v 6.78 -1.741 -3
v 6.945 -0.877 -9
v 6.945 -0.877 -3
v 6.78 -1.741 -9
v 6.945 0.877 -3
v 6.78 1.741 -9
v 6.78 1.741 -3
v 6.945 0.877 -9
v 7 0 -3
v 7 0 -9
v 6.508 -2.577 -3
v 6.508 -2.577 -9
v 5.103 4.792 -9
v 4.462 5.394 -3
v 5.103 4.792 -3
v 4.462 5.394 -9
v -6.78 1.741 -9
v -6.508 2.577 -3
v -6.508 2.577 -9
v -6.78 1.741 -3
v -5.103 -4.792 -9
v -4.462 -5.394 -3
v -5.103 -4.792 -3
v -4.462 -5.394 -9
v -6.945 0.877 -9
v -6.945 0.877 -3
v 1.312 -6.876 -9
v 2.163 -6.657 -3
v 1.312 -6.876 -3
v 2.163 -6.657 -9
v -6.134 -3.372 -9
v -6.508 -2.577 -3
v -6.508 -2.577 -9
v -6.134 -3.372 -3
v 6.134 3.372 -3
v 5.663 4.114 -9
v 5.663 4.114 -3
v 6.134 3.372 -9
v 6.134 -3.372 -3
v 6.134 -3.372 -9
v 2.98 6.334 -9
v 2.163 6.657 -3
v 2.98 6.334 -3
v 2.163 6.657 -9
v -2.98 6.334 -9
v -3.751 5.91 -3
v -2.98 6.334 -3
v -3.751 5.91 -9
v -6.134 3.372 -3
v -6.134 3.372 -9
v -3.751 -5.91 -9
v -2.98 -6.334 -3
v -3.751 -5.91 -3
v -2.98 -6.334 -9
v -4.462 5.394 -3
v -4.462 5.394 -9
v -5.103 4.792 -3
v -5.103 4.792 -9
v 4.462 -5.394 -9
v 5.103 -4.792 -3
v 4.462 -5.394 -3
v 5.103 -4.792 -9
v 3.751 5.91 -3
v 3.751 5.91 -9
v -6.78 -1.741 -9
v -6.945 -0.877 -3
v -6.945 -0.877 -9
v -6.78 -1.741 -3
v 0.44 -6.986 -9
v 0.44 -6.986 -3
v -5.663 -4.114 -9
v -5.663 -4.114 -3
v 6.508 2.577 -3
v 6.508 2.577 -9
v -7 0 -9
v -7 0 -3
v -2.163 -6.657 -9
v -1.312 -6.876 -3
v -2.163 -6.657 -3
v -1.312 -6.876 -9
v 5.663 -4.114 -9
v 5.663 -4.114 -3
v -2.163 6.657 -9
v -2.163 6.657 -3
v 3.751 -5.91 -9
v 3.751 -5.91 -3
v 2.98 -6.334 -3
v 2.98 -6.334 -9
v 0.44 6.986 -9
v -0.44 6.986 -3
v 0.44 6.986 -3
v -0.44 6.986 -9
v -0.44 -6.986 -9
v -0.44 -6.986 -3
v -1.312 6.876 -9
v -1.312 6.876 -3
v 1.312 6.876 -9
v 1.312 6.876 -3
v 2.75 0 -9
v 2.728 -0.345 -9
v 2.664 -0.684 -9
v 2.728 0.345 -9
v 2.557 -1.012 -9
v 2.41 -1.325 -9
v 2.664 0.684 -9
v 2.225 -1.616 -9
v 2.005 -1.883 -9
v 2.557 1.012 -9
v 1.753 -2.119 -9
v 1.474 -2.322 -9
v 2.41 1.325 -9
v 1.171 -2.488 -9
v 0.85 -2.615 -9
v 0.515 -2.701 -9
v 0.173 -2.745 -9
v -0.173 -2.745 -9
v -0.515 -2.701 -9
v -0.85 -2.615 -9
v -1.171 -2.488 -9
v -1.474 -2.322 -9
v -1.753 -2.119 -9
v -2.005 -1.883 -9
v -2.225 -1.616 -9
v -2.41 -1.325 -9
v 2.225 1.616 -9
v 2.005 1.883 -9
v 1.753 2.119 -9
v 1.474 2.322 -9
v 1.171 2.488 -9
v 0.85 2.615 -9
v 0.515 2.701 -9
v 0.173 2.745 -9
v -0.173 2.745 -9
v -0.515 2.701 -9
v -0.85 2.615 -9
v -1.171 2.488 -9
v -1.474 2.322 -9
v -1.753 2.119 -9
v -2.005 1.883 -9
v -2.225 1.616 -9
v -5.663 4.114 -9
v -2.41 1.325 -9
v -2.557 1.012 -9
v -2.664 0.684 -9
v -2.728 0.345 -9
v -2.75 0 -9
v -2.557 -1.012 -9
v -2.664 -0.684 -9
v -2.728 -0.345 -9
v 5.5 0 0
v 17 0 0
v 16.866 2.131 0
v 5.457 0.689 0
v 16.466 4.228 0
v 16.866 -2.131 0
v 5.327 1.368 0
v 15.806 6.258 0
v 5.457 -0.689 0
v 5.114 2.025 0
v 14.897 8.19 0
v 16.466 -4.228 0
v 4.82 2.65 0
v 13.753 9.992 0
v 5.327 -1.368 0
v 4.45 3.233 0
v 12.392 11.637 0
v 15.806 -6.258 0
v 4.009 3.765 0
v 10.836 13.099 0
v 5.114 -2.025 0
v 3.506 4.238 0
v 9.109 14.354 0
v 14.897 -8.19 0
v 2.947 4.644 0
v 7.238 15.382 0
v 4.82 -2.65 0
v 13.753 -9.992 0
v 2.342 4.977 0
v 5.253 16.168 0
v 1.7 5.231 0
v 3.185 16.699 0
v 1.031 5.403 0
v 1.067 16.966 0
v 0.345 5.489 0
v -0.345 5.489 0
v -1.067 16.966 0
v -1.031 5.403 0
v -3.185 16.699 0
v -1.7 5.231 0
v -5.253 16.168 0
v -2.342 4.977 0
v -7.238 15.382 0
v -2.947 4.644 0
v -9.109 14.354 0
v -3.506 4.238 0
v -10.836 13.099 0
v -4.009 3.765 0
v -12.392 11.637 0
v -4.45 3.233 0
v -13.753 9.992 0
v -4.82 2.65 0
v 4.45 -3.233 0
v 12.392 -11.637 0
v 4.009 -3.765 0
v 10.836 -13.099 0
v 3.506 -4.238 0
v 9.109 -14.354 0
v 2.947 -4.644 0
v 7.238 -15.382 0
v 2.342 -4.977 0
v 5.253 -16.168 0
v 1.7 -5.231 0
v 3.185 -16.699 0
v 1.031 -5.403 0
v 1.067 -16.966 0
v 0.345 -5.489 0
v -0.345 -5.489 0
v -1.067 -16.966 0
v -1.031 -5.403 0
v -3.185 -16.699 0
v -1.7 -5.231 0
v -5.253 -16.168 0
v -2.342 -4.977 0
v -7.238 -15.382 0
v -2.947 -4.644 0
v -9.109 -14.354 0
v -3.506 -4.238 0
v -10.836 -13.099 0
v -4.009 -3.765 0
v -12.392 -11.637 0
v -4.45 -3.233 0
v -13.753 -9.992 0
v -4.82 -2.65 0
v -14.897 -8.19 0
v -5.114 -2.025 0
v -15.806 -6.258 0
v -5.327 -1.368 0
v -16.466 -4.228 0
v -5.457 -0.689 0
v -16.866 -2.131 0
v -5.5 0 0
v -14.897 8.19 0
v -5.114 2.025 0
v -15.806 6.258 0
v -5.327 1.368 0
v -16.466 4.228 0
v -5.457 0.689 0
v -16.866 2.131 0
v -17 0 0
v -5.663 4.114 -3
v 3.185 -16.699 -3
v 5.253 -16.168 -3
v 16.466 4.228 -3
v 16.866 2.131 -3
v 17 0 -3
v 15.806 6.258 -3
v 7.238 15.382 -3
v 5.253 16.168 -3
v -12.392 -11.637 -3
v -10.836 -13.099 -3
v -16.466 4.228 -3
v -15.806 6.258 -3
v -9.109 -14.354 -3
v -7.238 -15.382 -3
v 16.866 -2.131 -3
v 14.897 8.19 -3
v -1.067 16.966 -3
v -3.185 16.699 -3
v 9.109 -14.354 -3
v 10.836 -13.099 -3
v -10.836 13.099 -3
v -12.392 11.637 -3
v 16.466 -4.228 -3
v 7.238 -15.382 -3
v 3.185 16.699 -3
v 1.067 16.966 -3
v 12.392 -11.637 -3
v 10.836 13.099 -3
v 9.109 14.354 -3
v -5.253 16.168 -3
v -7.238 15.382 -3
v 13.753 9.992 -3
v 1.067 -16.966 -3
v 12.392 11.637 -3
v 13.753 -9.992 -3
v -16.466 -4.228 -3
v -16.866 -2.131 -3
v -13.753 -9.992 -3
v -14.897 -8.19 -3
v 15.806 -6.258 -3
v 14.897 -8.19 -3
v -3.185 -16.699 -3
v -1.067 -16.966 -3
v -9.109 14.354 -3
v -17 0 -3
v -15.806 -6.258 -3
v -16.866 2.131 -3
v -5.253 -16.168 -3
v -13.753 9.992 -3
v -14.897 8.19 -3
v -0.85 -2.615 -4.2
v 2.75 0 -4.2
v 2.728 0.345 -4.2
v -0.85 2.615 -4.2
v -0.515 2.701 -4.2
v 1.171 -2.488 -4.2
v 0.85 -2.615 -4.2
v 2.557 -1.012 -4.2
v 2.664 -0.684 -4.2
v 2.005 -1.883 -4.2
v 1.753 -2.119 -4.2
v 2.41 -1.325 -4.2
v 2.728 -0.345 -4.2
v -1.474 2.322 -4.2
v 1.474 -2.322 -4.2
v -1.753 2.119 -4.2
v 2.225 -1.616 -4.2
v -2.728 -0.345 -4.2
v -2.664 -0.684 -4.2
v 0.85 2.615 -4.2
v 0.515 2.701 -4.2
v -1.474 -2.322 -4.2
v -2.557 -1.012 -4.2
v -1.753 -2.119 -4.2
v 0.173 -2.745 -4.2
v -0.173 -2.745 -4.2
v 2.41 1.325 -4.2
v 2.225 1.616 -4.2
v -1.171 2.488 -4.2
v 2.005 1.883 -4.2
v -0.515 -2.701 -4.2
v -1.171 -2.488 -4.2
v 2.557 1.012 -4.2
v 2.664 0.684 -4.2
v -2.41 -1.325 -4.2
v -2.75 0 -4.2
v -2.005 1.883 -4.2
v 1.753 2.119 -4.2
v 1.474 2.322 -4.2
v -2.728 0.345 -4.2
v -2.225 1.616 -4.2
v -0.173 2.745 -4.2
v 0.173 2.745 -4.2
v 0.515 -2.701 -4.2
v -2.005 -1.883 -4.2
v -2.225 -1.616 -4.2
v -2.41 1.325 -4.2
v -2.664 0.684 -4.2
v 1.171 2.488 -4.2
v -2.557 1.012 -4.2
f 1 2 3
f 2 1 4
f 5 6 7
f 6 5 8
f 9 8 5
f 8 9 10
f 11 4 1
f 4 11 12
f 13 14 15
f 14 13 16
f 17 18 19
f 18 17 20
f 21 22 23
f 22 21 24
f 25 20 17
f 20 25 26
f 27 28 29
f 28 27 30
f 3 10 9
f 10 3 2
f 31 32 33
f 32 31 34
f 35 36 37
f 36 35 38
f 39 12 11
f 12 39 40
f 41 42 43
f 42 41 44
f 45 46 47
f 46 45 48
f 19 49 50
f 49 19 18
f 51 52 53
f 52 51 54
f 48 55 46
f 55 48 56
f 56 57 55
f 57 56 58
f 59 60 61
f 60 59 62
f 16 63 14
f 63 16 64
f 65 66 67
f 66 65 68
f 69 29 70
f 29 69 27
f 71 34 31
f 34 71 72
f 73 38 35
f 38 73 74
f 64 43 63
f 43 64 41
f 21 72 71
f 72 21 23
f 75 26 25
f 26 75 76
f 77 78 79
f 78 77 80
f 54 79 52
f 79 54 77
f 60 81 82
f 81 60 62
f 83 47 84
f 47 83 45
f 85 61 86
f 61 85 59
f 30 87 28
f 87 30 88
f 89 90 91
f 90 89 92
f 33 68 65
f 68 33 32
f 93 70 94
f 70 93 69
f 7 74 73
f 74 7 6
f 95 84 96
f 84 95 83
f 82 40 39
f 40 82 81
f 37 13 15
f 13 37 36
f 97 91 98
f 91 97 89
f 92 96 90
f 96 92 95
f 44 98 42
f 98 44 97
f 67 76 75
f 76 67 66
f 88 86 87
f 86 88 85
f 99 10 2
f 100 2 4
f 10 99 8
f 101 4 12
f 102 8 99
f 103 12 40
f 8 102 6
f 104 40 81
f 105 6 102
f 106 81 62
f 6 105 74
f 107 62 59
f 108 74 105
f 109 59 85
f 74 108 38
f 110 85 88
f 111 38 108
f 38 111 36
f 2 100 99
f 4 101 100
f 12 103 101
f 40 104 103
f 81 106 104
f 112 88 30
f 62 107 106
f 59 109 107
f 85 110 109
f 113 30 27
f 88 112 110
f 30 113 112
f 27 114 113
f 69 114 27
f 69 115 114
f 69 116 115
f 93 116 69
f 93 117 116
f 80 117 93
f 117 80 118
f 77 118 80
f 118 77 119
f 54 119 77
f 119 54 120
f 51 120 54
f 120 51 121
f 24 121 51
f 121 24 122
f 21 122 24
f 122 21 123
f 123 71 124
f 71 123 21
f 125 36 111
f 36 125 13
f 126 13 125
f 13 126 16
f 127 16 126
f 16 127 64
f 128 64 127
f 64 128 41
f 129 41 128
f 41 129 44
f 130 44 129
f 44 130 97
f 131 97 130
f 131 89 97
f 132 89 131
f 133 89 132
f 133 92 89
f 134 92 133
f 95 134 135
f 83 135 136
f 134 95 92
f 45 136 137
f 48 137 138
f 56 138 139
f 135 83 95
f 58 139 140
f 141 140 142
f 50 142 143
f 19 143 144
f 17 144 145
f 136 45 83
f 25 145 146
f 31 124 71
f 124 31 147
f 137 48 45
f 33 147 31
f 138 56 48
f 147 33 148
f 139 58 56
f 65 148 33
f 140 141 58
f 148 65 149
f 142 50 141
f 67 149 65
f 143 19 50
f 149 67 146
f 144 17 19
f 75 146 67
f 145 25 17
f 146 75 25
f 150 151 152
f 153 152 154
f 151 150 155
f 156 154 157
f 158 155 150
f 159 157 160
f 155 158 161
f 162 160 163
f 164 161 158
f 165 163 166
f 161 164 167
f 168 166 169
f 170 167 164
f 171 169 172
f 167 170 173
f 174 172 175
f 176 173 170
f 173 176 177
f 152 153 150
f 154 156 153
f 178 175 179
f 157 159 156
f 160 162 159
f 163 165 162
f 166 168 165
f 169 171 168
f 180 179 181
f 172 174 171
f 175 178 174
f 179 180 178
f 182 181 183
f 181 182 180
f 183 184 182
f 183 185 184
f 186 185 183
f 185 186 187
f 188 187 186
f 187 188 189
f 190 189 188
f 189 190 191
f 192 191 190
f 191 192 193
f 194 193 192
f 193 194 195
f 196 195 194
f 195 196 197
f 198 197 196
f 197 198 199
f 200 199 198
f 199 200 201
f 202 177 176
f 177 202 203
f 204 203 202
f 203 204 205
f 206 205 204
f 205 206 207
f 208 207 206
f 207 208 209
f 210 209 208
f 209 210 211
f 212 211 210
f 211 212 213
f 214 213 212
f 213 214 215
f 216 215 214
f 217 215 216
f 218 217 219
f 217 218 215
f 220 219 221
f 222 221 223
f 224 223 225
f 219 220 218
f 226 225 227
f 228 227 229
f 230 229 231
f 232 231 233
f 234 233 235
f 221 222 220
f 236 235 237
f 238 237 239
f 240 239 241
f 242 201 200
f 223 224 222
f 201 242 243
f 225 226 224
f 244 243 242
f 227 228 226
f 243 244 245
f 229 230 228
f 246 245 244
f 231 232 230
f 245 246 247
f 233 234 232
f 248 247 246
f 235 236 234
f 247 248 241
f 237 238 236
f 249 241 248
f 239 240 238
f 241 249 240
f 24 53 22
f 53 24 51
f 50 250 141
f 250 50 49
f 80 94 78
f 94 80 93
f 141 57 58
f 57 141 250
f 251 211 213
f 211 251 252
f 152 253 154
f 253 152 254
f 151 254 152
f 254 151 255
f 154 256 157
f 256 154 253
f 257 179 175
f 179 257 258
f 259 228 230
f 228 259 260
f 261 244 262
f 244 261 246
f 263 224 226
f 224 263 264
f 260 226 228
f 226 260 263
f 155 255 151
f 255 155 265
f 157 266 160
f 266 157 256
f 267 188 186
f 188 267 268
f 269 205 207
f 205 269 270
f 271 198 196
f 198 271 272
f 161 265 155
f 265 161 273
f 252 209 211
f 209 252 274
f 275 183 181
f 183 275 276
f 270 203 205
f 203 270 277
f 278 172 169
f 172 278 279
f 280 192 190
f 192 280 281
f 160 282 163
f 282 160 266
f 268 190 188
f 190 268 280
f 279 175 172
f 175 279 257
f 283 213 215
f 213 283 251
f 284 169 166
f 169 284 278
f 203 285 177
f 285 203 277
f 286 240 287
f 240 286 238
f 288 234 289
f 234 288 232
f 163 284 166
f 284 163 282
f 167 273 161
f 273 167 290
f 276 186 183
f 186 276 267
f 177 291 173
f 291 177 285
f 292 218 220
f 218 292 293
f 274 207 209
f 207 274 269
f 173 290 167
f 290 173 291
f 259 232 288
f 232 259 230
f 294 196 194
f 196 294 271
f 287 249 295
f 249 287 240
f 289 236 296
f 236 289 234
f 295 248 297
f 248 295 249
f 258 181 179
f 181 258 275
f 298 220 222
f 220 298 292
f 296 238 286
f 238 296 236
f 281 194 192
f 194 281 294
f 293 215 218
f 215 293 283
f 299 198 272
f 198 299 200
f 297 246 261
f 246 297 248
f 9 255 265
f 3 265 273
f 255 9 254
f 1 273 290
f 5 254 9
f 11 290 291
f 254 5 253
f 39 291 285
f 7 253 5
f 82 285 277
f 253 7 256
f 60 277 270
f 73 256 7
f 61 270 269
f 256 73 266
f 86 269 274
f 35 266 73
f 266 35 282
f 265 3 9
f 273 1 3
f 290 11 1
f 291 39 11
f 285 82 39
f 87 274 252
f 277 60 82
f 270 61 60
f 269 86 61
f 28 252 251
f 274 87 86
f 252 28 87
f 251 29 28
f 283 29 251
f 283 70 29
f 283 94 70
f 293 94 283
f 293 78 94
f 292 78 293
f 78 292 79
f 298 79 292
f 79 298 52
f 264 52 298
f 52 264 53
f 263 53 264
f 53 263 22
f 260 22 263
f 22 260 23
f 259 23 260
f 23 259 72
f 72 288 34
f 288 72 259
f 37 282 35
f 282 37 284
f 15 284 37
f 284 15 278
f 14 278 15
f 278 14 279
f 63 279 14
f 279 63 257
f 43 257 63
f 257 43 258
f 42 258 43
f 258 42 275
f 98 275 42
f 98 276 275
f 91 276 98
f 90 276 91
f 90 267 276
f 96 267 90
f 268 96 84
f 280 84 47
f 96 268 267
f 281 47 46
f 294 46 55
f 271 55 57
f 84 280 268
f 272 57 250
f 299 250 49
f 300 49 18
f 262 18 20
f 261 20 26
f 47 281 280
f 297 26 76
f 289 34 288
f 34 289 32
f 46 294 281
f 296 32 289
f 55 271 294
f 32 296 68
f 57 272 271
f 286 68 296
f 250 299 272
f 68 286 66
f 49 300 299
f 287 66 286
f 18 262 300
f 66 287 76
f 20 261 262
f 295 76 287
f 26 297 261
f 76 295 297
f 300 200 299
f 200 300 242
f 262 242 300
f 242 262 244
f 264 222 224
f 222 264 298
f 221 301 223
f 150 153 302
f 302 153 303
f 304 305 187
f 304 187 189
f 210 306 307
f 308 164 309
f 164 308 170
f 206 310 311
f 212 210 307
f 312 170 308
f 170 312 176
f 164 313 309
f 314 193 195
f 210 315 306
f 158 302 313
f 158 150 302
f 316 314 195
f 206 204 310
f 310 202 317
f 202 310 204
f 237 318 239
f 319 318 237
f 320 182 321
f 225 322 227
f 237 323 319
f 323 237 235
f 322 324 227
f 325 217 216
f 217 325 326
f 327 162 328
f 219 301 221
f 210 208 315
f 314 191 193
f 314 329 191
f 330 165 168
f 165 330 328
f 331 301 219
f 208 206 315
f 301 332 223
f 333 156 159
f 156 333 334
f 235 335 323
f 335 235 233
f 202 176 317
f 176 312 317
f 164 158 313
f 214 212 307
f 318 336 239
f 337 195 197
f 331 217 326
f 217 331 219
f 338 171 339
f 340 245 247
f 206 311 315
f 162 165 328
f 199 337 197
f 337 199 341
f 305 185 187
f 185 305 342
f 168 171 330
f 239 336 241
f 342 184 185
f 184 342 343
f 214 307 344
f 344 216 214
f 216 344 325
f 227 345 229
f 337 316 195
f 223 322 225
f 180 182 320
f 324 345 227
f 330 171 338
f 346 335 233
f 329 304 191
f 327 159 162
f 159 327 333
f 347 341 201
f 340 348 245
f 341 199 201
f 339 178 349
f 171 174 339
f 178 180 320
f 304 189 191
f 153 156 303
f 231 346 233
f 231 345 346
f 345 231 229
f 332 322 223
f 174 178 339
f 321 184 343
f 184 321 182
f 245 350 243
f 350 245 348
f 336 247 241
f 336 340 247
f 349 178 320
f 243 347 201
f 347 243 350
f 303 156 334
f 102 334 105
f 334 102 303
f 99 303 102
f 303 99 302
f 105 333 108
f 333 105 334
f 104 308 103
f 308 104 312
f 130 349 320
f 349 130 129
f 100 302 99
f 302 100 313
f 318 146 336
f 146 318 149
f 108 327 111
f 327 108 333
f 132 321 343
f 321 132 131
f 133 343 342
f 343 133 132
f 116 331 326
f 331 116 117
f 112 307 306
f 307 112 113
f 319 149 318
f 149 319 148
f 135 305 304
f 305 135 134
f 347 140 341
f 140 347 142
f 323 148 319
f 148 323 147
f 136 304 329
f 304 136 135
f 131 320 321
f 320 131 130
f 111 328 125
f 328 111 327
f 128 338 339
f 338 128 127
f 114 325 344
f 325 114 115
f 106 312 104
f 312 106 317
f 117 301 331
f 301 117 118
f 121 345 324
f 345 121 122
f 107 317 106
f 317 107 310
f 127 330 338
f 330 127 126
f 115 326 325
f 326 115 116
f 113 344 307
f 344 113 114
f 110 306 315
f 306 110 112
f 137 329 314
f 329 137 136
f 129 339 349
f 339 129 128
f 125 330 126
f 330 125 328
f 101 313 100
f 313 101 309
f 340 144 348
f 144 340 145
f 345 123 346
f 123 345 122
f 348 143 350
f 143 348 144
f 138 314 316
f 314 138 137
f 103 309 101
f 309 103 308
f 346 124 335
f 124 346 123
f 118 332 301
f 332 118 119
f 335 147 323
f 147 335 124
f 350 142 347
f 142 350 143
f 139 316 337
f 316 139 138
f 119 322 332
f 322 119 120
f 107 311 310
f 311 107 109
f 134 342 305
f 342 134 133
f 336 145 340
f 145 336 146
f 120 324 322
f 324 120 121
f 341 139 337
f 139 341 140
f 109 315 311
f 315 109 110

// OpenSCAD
$fn = 50;


difference() {
	union() {
		translate(v = [0, 0, -9.0000000000]) {
			cylinder(h = 9, r = 7.0000000000);
		}
		translate(v = [0, 0, -3.0000000000]) {
			cylinder(h = 3, r = 17.0000000000);
		}
	}
	union() {
		translate(v = [0, 0, 0]) {
			rotate(a = [0, 0, 0]) {
				difference() {
					union() {
						#translate(v = [0, 0, -9.0000000000]) {
							cylinder(h = 9, r = 2.2500000000);
						}
						#translate(v = [0, 0, -4.2000000000]) {
							cylinder(h = 4.2000000000, r = 7.0000000000, r1 = 2.7500000000, r2 = 5.5000000000);
						}
						#translate(v = [0, 0, -9.0000000000]) {
							cylinder(h = 9, r = 2.7500000000);
						}
						#translate(v = [0, 0, -9.0000000000]) {
							cylinder(h = 9, r = 2.2500000000);
						}
					}
					union();
				}
			}
		}
	}
}
